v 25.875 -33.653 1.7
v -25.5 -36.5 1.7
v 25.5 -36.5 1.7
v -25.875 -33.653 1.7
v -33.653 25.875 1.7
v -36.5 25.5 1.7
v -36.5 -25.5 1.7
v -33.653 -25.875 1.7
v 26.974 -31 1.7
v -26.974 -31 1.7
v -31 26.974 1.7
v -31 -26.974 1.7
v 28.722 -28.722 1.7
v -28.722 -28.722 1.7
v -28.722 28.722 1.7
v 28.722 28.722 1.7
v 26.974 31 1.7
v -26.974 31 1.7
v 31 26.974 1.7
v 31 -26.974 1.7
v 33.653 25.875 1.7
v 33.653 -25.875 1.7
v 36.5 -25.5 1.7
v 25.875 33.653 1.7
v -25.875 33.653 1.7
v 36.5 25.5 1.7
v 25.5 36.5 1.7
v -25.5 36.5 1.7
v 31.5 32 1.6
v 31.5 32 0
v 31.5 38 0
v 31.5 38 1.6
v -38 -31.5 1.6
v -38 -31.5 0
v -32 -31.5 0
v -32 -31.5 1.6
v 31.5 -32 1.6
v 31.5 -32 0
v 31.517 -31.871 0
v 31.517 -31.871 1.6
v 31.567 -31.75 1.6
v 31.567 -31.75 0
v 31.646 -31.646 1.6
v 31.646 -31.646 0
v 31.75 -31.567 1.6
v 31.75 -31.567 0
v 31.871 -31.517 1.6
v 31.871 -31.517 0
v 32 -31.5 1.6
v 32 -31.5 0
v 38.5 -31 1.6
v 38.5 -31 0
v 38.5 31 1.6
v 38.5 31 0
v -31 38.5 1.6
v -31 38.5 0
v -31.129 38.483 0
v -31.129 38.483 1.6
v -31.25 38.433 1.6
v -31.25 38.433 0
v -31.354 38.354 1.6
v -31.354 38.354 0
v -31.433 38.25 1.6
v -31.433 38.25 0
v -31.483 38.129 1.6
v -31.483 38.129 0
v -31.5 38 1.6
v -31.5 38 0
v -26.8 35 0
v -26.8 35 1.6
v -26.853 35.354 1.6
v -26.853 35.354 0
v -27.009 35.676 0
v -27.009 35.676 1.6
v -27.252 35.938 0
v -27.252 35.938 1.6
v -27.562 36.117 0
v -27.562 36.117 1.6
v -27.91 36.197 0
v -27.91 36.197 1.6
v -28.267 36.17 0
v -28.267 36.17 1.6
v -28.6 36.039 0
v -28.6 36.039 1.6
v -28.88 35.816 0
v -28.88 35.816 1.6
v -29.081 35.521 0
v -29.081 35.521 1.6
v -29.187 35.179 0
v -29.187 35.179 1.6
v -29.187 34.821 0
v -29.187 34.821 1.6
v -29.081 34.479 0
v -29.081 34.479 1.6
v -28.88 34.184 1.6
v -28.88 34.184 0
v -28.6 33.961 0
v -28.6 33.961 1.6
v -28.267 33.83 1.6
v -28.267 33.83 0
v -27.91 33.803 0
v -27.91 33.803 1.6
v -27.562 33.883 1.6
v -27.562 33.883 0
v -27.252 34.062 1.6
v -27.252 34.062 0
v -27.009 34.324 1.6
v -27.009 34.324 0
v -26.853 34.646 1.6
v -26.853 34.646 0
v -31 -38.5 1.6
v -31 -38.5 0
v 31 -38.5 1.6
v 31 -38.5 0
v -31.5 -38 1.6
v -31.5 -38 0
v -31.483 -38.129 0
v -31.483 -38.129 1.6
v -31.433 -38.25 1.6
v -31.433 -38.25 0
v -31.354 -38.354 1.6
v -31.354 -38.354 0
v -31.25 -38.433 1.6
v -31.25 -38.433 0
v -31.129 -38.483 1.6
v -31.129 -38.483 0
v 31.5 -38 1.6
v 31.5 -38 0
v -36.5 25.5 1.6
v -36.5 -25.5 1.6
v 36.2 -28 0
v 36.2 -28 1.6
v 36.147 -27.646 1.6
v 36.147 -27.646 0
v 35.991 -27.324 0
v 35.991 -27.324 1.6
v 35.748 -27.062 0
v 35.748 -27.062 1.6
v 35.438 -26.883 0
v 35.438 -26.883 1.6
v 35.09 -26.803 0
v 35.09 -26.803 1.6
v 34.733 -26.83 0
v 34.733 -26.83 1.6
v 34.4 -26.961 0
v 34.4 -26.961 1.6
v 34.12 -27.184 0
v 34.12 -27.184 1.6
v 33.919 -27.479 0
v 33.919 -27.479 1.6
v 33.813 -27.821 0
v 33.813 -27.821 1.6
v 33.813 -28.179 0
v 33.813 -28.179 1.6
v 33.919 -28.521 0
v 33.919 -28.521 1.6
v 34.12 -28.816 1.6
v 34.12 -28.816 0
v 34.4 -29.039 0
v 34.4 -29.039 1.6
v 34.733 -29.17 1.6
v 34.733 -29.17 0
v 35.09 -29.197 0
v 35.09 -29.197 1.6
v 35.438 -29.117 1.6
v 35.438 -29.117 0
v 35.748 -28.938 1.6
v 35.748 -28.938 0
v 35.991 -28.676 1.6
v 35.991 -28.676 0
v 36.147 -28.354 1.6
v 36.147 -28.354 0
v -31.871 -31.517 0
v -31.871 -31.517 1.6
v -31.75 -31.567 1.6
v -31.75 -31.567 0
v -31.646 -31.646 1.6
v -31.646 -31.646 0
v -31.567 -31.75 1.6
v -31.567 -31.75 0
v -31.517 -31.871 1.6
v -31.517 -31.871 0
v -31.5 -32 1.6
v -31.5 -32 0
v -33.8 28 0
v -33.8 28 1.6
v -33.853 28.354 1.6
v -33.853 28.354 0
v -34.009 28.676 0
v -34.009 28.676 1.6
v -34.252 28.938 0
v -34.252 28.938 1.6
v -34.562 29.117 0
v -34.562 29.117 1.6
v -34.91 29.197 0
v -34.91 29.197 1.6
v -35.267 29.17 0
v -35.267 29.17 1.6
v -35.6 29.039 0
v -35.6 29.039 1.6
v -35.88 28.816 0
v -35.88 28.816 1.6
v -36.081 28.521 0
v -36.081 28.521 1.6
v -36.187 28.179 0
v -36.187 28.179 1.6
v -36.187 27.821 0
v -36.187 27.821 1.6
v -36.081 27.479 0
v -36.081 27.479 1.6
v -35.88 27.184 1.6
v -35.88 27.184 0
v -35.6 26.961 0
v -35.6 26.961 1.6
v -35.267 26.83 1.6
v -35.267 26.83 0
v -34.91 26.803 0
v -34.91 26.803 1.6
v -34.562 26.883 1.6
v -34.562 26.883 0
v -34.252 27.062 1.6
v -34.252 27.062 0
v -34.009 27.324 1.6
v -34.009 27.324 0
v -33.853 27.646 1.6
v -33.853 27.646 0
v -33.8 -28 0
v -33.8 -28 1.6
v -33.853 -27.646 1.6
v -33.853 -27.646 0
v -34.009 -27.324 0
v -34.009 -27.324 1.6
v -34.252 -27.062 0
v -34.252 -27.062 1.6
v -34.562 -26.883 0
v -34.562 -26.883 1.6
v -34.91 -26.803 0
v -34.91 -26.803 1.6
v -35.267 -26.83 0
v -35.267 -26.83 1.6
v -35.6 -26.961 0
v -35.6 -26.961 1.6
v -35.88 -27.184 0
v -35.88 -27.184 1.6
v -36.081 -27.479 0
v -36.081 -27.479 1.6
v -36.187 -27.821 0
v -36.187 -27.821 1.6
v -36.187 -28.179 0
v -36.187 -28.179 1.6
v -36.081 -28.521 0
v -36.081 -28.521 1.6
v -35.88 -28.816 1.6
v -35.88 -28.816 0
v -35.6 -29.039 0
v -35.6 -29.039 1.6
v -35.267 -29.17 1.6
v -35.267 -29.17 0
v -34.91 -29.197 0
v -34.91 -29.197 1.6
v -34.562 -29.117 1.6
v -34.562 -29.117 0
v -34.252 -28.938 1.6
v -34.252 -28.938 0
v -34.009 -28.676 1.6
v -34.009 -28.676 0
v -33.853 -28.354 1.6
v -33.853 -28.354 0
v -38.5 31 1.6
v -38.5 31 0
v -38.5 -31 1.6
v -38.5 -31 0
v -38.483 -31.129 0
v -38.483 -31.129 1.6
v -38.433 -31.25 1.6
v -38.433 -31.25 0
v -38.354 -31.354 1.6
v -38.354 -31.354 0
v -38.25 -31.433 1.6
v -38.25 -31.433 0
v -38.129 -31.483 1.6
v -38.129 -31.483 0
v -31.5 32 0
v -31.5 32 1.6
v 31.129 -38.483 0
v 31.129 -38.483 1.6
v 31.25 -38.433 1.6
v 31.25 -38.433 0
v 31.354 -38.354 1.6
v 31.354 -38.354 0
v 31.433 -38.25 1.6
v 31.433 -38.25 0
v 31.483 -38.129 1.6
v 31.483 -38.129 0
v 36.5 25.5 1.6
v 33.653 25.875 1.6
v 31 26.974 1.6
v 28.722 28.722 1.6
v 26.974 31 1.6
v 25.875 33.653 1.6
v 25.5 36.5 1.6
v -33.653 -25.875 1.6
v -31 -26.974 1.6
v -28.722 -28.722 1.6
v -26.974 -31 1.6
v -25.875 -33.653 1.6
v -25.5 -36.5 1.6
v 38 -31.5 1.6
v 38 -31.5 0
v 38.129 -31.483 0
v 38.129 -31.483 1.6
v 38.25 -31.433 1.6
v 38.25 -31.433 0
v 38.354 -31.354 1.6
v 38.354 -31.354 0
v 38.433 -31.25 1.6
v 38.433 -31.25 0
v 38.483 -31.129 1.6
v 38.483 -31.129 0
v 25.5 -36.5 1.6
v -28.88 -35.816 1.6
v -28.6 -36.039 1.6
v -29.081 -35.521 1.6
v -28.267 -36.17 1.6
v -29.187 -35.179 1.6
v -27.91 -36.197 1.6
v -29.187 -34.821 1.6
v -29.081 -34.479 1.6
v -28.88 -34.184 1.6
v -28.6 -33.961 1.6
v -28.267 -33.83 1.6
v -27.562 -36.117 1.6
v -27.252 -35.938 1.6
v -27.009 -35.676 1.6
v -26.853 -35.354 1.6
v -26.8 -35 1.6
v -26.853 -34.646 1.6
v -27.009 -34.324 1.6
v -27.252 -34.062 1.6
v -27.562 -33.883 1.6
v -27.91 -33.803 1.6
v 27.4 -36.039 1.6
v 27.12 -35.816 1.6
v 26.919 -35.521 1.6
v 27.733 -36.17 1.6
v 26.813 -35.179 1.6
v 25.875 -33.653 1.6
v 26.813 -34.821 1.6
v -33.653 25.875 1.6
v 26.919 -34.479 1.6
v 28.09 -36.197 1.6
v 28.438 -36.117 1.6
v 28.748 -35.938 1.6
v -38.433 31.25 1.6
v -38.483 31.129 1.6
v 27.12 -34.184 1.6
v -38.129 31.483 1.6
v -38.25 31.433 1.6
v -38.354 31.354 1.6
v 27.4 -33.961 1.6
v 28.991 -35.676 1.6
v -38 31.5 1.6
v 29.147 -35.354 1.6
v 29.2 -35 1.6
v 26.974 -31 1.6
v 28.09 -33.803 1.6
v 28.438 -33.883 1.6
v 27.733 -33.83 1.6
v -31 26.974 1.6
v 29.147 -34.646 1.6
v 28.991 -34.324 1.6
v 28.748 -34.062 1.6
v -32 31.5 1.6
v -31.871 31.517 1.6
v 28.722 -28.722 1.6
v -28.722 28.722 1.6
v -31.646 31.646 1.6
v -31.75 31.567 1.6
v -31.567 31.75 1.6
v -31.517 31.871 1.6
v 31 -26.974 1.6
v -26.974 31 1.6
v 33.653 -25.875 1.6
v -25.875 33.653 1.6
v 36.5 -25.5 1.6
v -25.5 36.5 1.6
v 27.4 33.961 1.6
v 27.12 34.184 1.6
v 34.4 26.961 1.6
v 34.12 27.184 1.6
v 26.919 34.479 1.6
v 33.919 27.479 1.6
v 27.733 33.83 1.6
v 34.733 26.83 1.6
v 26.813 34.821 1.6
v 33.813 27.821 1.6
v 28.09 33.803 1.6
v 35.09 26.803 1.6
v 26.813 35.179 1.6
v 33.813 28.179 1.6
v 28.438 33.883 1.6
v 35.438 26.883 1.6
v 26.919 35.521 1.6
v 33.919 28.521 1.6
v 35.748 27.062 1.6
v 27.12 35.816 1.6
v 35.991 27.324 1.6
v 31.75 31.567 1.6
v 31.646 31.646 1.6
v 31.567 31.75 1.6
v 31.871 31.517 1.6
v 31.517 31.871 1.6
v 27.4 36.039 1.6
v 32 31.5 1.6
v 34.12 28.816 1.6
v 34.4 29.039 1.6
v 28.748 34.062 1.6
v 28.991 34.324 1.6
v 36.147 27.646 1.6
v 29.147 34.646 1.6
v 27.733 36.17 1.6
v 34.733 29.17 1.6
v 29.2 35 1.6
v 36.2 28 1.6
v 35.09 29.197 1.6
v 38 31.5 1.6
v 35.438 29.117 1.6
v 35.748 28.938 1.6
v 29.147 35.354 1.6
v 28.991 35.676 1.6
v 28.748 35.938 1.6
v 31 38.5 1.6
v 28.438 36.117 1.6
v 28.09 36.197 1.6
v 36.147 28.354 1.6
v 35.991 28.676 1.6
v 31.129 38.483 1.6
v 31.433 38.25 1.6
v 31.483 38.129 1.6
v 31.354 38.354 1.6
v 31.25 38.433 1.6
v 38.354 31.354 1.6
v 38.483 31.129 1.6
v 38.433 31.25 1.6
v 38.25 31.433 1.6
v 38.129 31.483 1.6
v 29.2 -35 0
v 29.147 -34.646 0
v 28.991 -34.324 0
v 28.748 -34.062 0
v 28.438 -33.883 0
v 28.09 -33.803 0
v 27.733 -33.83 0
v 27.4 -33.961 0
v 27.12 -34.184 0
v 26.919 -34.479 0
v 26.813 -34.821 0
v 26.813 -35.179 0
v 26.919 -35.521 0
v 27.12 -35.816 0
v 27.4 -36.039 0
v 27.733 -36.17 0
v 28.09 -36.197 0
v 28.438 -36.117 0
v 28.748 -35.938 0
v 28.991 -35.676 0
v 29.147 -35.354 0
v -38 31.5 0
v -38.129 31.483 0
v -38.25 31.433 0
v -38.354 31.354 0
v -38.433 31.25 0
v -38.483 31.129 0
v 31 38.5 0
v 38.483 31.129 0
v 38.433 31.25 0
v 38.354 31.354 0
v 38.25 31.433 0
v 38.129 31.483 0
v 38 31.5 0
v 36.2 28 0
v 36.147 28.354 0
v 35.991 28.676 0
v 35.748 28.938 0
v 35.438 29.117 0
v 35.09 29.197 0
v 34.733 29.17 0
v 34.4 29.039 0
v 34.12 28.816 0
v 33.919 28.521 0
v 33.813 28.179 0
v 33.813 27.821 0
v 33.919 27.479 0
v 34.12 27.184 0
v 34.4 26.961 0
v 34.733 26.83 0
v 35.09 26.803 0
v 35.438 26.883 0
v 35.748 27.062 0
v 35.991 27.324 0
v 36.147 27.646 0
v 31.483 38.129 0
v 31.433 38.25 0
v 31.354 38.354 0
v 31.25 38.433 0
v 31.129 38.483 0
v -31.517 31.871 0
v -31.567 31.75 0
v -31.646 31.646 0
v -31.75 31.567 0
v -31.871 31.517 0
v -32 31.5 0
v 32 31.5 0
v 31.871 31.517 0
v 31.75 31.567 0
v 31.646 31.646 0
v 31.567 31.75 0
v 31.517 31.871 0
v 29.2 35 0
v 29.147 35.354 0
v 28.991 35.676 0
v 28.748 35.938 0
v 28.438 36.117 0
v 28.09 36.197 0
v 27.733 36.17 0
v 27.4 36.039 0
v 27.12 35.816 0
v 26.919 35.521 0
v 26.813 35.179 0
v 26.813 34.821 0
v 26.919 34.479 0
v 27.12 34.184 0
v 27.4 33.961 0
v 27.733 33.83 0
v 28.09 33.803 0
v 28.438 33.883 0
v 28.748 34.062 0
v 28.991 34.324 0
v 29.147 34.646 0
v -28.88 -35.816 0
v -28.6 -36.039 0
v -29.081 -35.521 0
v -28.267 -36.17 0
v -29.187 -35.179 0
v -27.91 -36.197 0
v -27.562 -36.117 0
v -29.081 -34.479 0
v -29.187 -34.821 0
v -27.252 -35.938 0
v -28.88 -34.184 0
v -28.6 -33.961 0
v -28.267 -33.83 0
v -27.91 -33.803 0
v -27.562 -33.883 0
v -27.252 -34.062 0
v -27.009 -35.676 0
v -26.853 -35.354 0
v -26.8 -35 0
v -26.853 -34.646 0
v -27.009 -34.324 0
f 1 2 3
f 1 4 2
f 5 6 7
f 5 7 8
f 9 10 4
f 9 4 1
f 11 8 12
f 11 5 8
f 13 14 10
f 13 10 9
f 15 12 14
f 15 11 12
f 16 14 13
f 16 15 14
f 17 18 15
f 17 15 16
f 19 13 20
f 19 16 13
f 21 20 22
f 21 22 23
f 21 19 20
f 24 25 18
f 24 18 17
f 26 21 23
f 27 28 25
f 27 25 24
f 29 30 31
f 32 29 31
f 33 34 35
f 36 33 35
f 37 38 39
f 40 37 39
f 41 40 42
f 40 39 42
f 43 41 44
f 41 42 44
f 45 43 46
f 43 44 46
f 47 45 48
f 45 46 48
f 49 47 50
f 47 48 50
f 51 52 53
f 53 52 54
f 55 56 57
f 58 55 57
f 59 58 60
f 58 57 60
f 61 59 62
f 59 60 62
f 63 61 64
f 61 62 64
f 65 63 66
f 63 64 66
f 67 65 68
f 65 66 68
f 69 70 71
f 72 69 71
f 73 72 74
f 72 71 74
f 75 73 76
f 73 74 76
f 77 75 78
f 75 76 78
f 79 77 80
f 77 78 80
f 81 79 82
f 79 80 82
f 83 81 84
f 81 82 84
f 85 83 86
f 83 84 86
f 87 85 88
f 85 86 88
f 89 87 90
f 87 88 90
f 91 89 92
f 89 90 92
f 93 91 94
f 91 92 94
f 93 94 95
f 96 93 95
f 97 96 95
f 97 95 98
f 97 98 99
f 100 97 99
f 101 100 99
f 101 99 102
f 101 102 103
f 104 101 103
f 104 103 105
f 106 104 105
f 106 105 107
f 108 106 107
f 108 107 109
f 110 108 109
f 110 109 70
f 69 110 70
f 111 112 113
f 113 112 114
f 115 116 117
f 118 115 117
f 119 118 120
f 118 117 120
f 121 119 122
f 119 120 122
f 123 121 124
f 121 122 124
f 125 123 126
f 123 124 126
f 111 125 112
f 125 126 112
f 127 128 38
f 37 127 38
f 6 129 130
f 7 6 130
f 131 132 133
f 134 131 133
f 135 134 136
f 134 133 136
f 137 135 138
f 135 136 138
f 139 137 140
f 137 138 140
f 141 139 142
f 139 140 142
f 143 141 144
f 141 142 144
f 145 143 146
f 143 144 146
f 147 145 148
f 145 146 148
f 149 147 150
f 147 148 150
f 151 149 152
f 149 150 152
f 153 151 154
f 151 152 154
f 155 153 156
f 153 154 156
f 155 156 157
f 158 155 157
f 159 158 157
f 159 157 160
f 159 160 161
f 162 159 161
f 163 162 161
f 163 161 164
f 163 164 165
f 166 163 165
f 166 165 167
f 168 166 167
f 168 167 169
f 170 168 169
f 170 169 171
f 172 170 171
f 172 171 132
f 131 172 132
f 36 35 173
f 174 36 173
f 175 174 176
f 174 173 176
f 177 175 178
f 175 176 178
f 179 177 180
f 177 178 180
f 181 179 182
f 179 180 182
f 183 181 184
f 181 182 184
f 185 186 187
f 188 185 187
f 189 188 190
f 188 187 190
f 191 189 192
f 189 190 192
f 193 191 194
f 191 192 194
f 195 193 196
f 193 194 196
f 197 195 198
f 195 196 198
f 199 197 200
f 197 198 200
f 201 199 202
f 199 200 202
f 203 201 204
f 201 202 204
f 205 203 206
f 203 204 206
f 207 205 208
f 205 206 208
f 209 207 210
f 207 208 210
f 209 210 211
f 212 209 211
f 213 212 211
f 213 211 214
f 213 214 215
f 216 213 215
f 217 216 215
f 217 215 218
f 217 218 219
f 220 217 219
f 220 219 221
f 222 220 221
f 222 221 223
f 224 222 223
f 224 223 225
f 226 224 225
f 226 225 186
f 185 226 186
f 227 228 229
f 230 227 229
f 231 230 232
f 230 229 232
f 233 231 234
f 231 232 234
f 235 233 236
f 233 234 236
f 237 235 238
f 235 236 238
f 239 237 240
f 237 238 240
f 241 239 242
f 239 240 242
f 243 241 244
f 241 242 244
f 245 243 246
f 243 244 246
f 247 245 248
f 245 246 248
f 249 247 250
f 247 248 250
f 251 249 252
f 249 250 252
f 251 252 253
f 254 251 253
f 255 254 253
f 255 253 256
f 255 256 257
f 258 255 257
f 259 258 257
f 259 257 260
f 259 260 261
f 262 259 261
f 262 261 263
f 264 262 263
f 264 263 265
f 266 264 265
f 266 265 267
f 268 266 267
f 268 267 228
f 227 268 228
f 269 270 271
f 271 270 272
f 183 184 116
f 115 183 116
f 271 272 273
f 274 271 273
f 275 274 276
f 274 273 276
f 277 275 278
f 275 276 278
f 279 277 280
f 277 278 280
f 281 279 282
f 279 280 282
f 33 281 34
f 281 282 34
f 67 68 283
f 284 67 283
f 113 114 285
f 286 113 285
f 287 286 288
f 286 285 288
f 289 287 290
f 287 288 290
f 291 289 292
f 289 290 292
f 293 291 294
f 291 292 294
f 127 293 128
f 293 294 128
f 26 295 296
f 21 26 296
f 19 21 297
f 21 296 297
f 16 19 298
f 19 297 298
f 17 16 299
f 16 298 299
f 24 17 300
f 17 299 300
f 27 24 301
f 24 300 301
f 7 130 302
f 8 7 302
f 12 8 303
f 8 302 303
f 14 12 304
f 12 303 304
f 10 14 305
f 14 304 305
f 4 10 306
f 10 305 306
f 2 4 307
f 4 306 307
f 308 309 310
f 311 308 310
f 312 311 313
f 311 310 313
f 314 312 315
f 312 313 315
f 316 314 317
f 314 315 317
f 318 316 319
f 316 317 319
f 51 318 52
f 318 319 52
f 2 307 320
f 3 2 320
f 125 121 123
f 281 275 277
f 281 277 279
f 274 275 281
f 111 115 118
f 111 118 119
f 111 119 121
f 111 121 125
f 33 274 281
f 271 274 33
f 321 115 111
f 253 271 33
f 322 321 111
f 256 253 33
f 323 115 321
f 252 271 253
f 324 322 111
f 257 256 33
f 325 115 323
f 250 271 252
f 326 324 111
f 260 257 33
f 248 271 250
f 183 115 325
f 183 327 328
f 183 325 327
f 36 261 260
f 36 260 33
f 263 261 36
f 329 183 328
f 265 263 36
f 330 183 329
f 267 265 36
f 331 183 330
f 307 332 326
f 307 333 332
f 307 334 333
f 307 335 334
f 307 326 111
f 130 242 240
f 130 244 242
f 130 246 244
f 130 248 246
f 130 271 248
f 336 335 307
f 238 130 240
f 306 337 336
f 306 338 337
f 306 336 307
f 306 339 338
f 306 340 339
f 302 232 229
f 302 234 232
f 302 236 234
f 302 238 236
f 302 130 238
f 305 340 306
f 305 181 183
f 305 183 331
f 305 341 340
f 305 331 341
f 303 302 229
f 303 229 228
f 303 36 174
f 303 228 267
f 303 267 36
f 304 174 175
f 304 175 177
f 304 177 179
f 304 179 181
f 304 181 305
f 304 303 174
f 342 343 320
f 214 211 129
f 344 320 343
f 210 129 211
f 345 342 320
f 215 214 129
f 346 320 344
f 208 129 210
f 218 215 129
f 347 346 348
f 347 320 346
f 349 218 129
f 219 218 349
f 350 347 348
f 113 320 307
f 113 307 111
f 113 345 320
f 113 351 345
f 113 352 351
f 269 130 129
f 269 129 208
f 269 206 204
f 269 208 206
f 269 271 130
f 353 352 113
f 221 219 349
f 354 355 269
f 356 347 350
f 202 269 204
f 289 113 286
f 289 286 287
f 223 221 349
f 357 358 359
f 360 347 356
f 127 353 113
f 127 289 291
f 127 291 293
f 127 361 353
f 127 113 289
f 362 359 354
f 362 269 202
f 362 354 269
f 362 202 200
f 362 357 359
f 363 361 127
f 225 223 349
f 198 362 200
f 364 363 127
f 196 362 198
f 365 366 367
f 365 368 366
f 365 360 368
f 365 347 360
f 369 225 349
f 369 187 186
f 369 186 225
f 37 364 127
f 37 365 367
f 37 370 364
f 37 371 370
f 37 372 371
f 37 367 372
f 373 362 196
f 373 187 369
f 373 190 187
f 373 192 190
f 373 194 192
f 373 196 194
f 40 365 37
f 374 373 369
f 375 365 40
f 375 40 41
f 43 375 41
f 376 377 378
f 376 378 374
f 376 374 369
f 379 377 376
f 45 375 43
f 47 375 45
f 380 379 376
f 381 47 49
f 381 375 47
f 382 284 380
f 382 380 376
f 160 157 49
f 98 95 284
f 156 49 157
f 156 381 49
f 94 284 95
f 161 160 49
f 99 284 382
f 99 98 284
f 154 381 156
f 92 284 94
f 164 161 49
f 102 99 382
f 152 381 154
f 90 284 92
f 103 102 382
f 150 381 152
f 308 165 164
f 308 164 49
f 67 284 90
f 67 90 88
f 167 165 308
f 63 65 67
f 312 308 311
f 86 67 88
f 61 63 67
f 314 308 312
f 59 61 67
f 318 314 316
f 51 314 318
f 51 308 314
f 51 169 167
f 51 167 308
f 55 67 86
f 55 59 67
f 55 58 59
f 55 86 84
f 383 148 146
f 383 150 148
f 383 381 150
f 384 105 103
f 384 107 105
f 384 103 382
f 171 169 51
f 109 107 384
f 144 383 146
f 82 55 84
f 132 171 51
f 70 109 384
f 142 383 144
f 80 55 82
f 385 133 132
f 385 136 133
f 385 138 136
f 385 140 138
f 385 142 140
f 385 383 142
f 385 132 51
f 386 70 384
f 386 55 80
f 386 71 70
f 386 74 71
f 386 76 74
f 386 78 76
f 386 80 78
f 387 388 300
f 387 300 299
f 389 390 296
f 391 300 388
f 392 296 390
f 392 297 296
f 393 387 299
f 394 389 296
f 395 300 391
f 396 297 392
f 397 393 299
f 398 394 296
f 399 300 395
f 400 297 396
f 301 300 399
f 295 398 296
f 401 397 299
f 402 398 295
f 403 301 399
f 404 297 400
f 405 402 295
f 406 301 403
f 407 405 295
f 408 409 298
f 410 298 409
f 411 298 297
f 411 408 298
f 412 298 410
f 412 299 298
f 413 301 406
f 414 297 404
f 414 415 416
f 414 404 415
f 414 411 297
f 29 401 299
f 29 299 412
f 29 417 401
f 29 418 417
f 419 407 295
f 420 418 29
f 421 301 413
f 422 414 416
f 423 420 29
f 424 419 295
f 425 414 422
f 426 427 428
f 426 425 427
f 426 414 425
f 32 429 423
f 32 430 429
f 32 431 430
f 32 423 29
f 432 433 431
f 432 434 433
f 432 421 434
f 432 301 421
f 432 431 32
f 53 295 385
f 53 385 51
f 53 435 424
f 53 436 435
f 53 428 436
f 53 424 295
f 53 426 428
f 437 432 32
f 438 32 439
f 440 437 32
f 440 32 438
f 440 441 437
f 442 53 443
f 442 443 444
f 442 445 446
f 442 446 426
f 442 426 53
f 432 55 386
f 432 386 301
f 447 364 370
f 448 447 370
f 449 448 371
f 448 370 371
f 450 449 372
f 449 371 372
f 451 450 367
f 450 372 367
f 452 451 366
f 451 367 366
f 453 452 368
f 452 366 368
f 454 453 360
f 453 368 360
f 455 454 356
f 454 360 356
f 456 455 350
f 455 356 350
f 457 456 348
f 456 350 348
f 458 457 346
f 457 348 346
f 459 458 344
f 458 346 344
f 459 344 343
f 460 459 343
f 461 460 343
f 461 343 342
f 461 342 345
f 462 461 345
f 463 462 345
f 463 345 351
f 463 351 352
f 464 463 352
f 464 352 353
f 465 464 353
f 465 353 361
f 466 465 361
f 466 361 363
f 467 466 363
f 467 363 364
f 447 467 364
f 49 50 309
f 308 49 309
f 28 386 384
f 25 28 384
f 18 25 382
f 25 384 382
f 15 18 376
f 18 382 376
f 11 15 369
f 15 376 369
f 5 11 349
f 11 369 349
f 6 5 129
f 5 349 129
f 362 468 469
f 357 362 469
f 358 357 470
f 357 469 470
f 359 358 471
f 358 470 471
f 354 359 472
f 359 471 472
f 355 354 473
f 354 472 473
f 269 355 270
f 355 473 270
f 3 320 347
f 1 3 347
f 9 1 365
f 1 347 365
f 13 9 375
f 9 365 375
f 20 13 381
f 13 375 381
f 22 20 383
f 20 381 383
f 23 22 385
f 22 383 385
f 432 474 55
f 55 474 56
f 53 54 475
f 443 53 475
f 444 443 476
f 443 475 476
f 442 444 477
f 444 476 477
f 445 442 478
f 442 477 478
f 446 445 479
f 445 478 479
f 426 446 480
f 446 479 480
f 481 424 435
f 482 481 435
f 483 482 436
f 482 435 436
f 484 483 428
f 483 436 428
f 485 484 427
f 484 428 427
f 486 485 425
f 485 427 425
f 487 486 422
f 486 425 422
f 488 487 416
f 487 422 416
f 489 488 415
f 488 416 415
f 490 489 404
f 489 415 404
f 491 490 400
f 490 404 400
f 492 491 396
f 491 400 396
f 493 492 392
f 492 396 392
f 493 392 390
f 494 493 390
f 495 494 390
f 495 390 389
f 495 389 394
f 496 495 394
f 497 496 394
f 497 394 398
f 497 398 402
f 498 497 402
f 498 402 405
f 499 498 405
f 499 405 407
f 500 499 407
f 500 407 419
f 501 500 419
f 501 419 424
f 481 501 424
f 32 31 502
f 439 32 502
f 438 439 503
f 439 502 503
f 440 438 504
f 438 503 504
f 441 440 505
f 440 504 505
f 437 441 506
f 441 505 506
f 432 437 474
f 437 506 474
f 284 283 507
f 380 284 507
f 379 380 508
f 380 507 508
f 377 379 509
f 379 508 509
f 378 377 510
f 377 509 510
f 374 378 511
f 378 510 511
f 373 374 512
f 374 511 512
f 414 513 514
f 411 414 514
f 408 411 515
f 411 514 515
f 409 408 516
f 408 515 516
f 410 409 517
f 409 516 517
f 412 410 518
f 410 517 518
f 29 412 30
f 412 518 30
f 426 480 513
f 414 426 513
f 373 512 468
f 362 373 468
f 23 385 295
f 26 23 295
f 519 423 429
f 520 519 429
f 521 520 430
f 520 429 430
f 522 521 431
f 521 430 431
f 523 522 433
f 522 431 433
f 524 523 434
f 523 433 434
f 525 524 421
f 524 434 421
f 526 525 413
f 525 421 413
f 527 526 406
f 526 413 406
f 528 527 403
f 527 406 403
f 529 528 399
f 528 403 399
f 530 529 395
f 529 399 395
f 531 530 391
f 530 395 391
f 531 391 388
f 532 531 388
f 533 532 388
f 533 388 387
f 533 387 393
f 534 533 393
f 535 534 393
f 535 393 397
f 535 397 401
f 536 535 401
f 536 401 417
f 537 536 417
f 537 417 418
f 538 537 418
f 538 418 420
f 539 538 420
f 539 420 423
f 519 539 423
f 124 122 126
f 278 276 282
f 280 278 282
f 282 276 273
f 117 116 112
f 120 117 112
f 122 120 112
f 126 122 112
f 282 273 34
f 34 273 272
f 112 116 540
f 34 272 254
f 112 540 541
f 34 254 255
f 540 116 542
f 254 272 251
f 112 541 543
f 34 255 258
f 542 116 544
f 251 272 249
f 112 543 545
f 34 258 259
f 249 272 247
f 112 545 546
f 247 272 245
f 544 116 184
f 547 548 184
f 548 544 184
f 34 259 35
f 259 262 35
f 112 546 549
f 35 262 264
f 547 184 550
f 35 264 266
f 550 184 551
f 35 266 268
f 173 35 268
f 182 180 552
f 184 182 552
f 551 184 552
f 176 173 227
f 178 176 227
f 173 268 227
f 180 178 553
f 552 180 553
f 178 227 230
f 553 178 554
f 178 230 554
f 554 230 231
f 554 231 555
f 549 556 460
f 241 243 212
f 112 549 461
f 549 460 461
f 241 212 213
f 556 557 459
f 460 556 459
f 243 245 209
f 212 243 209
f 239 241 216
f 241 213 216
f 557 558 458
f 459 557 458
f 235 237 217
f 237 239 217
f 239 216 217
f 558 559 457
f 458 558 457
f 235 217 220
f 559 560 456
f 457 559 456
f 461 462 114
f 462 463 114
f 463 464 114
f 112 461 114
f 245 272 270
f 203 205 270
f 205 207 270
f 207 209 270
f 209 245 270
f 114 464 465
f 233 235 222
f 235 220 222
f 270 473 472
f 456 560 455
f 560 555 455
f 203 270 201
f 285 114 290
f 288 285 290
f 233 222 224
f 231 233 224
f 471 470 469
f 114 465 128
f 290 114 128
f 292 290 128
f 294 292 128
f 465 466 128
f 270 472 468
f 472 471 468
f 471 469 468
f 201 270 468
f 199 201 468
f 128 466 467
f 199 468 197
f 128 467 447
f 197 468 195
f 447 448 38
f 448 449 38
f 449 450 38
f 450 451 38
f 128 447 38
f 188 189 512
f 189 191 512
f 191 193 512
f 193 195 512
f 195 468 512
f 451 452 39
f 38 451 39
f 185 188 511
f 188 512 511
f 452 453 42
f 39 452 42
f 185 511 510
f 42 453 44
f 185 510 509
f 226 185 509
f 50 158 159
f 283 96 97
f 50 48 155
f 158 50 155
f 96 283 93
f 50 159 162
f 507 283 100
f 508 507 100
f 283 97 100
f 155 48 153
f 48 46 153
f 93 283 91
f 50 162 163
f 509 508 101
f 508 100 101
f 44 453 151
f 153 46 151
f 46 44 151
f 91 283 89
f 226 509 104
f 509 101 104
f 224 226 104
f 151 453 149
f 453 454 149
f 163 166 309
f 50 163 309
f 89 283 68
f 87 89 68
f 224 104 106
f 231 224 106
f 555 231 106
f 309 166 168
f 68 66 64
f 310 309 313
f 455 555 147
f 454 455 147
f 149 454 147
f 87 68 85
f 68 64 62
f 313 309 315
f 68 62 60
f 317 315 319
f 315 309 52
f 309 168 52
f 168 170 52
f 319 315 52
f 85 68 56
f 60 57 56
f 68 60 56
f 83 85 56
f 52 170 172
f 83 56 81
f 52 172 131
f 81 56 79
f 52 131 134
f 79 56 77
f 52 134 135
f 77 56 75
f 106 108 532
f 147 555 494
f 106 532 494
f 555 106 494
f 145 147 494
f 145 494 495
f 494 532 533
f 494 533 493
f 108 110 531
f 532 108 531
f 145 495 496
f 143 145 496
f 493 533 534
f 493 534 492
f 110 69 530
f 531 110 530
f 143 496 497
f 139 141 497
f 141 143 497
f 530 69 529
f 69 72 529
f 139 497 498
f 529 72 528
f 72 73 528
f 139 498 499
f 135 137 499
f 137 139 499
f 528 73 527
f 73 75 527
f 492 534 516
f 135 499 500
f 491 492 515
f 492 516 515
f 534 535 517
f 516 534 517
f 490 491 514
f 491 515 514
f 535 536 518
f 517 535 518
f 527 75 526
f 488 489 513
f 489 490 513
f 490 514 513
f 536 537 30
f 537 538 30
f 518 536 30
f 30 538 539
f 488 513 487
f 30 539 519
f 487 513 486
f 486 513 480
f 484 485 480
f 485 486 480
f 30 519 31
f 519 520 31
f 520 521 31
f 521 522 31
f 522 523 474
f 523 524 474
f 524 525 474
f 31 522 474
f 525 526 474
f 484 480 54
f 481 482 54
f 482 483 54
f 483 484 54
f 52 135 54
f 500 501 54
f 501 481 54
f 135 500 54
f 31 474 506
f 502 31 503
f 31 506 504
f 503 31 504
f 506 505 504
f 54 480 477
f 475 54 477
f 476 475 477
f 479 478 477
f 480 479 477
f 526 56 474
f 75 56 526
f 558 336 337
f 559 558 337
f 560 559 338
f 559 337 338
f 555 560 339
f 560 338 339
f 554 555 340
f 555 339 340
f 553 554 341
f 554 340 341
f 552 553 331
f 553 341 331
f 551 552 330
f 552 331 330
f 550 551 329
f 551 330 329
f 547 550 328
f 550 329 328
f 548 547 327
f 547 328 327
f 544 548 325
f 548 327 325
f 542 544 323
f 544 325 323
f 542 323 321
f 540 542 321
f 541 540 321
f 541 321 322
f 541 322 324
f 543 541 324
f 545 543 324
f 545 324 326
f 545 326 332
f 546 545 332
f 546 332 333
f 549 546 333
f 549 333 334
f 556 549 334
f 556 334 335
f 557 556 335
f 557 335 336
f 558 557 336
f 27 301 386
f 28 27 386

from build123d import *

# Parameters (mm, degrees)
BOSS_EXTRUDE1_DEPTH            = 1.6
BOSS_EXTRUDE2_DEPTH            = 0.1
M2_HOLE1_FIXINGSTRUCTURE_D     = 2.4
M2_HOLE1_FIXINGSTRUCTURE_DEPTH = 200
M2_HOLE1_FIXINGSTRUCTURE_TIP   = 0.721032743


with BuildPart() as part:
    # Sketch1 → Boss-Extrude1 (new body)
    with BuildSketch(Plane.XY):
        with BuildLine():
            Line((-31.5, 38), (-31.5, 32))
            ThreePointArc((-31.5, 32), (-31.646446609, 31.646446609), (-32, 31.5))
            Line((-32, 31.5), (-38, 31.5))
            ThreePointArc((-38, 31.5), (-38.353553391, 31.353553391), (-38.5, 31))
            Line((-38.5, 31), (-38.5, -31))
            ThreePointArc((-38.5, -31), (-38.353553391, -31.353553391), (-38, -31.5))
            Line((-38, -31.5), (-32, -31.5))
            ThreePointArc((-32, -31.5), (-31.646446609, -31.646446609), (-31.5, -32))
            Line((-31.5, -32), (-31.5, -38))
            ThreePointArc((-31.5, -38), (-31.353553391, -38.353553391), (-31, -38.5))
            Line((-31, -38.5), (31, -38.5))
            ThreePointArc((31, -38.5), (31.353553391, -38.353553391), (31.5, -38))
            Line((31.5, -38), (31.5, -32))
            ThreePointArc((31.5, -32), (31.646446609, -31.646446609), (32, -31.5))
            Line((32, -31.5), (38, -31.5))
            ThreePointArc((38, -31.5), (38.353553391, -31.353553391), (38.5, -31))
            Line((38.5, -31), (38.5, 31))
            ThreePointArc((38.5, 31), (38.353553391, 31.353553391), (38, 31.5))
            Line((38, 31.5), (32, 31.5))
            ThreePointArc((32, 31.5), (31.646446609, 31.646446609), (31.5, 32))
            Line((31.5, 32), (31.5, 38))
            ThreePointArc((31.5, 38), (31.353553391, 38.353553391), (31, 38.5))
            Line((31, 38.5), (-31, 38.5))
            ThreePointArc((-31, 38.5), (-31.353553391, 38.353553391), (-31.5, 38))
        make_face()
    extrude(amount=BOSS_EXTRUDE1_DEPTH)

    # Esboço1 → Boss-Extrude2 (add)
    with BuildSketch(Plane.XY.offset(1.6)):
        with BuildLine():
            Line((-25.5, -36.5), (25.5, -36.5))
            ThreePointArc((25.5, -36.5), (28.721825407, -28.721825407), (36.5, -25.5))
            Line((36.5, -25.5), (36.5, 25.5))
            ThreePointArc((36.5, 25.5), (28.721825407, 28.721825407), (25.5, 36.5))
            Line((25.5, 36.5), (-25.5, 36.5))
            ThreePointArc((-25.5, 36.5), (-28.721825407, 28.721825407), (-36.5, 25.5))
            Line((-36.5, 25.5), (-36.5, -25.5))
            ThreePointArc((-36.5, -25.5), (-28.721825407, -28.721825407), (-25.5, -36.5))
        make_face()
    extrude(amount=BOSS_EXTRUDE2_DEPTH)

    # M2 Hole1-FixingStructure
    with Locations(Plane(origin=(0, 0, 0), x_dir=(-1, 0, 0), z_dir=(0, 0, -1))):
        with Locations((-28, 35), (28, 35), (-28, -35), (28, -35), (35, 28), (35, -28), (-35, -28), (-35, 28)):
            Hole(M2_HOLE1_FIXINGSTRUCTURE_D / 2, depth=M2_HOLE1_FIXINGSTRUCTURE_DEPTH)
            with Locations((0, 0, -(M2_HOLE1_FIXINGSTRUCTURE_DEPTH + M2_HOLE1_FIXINGSTRUCTURE_TIP / 2))):  # 118° drill point
                Cone(0, M2_HOLE1_FIXINGSTRUCTURE_D / 2, M2_HOLE1_FIXINGSTRUCTURE_TIP, mode=Mode.SUBTRACT)


solid = part.part
